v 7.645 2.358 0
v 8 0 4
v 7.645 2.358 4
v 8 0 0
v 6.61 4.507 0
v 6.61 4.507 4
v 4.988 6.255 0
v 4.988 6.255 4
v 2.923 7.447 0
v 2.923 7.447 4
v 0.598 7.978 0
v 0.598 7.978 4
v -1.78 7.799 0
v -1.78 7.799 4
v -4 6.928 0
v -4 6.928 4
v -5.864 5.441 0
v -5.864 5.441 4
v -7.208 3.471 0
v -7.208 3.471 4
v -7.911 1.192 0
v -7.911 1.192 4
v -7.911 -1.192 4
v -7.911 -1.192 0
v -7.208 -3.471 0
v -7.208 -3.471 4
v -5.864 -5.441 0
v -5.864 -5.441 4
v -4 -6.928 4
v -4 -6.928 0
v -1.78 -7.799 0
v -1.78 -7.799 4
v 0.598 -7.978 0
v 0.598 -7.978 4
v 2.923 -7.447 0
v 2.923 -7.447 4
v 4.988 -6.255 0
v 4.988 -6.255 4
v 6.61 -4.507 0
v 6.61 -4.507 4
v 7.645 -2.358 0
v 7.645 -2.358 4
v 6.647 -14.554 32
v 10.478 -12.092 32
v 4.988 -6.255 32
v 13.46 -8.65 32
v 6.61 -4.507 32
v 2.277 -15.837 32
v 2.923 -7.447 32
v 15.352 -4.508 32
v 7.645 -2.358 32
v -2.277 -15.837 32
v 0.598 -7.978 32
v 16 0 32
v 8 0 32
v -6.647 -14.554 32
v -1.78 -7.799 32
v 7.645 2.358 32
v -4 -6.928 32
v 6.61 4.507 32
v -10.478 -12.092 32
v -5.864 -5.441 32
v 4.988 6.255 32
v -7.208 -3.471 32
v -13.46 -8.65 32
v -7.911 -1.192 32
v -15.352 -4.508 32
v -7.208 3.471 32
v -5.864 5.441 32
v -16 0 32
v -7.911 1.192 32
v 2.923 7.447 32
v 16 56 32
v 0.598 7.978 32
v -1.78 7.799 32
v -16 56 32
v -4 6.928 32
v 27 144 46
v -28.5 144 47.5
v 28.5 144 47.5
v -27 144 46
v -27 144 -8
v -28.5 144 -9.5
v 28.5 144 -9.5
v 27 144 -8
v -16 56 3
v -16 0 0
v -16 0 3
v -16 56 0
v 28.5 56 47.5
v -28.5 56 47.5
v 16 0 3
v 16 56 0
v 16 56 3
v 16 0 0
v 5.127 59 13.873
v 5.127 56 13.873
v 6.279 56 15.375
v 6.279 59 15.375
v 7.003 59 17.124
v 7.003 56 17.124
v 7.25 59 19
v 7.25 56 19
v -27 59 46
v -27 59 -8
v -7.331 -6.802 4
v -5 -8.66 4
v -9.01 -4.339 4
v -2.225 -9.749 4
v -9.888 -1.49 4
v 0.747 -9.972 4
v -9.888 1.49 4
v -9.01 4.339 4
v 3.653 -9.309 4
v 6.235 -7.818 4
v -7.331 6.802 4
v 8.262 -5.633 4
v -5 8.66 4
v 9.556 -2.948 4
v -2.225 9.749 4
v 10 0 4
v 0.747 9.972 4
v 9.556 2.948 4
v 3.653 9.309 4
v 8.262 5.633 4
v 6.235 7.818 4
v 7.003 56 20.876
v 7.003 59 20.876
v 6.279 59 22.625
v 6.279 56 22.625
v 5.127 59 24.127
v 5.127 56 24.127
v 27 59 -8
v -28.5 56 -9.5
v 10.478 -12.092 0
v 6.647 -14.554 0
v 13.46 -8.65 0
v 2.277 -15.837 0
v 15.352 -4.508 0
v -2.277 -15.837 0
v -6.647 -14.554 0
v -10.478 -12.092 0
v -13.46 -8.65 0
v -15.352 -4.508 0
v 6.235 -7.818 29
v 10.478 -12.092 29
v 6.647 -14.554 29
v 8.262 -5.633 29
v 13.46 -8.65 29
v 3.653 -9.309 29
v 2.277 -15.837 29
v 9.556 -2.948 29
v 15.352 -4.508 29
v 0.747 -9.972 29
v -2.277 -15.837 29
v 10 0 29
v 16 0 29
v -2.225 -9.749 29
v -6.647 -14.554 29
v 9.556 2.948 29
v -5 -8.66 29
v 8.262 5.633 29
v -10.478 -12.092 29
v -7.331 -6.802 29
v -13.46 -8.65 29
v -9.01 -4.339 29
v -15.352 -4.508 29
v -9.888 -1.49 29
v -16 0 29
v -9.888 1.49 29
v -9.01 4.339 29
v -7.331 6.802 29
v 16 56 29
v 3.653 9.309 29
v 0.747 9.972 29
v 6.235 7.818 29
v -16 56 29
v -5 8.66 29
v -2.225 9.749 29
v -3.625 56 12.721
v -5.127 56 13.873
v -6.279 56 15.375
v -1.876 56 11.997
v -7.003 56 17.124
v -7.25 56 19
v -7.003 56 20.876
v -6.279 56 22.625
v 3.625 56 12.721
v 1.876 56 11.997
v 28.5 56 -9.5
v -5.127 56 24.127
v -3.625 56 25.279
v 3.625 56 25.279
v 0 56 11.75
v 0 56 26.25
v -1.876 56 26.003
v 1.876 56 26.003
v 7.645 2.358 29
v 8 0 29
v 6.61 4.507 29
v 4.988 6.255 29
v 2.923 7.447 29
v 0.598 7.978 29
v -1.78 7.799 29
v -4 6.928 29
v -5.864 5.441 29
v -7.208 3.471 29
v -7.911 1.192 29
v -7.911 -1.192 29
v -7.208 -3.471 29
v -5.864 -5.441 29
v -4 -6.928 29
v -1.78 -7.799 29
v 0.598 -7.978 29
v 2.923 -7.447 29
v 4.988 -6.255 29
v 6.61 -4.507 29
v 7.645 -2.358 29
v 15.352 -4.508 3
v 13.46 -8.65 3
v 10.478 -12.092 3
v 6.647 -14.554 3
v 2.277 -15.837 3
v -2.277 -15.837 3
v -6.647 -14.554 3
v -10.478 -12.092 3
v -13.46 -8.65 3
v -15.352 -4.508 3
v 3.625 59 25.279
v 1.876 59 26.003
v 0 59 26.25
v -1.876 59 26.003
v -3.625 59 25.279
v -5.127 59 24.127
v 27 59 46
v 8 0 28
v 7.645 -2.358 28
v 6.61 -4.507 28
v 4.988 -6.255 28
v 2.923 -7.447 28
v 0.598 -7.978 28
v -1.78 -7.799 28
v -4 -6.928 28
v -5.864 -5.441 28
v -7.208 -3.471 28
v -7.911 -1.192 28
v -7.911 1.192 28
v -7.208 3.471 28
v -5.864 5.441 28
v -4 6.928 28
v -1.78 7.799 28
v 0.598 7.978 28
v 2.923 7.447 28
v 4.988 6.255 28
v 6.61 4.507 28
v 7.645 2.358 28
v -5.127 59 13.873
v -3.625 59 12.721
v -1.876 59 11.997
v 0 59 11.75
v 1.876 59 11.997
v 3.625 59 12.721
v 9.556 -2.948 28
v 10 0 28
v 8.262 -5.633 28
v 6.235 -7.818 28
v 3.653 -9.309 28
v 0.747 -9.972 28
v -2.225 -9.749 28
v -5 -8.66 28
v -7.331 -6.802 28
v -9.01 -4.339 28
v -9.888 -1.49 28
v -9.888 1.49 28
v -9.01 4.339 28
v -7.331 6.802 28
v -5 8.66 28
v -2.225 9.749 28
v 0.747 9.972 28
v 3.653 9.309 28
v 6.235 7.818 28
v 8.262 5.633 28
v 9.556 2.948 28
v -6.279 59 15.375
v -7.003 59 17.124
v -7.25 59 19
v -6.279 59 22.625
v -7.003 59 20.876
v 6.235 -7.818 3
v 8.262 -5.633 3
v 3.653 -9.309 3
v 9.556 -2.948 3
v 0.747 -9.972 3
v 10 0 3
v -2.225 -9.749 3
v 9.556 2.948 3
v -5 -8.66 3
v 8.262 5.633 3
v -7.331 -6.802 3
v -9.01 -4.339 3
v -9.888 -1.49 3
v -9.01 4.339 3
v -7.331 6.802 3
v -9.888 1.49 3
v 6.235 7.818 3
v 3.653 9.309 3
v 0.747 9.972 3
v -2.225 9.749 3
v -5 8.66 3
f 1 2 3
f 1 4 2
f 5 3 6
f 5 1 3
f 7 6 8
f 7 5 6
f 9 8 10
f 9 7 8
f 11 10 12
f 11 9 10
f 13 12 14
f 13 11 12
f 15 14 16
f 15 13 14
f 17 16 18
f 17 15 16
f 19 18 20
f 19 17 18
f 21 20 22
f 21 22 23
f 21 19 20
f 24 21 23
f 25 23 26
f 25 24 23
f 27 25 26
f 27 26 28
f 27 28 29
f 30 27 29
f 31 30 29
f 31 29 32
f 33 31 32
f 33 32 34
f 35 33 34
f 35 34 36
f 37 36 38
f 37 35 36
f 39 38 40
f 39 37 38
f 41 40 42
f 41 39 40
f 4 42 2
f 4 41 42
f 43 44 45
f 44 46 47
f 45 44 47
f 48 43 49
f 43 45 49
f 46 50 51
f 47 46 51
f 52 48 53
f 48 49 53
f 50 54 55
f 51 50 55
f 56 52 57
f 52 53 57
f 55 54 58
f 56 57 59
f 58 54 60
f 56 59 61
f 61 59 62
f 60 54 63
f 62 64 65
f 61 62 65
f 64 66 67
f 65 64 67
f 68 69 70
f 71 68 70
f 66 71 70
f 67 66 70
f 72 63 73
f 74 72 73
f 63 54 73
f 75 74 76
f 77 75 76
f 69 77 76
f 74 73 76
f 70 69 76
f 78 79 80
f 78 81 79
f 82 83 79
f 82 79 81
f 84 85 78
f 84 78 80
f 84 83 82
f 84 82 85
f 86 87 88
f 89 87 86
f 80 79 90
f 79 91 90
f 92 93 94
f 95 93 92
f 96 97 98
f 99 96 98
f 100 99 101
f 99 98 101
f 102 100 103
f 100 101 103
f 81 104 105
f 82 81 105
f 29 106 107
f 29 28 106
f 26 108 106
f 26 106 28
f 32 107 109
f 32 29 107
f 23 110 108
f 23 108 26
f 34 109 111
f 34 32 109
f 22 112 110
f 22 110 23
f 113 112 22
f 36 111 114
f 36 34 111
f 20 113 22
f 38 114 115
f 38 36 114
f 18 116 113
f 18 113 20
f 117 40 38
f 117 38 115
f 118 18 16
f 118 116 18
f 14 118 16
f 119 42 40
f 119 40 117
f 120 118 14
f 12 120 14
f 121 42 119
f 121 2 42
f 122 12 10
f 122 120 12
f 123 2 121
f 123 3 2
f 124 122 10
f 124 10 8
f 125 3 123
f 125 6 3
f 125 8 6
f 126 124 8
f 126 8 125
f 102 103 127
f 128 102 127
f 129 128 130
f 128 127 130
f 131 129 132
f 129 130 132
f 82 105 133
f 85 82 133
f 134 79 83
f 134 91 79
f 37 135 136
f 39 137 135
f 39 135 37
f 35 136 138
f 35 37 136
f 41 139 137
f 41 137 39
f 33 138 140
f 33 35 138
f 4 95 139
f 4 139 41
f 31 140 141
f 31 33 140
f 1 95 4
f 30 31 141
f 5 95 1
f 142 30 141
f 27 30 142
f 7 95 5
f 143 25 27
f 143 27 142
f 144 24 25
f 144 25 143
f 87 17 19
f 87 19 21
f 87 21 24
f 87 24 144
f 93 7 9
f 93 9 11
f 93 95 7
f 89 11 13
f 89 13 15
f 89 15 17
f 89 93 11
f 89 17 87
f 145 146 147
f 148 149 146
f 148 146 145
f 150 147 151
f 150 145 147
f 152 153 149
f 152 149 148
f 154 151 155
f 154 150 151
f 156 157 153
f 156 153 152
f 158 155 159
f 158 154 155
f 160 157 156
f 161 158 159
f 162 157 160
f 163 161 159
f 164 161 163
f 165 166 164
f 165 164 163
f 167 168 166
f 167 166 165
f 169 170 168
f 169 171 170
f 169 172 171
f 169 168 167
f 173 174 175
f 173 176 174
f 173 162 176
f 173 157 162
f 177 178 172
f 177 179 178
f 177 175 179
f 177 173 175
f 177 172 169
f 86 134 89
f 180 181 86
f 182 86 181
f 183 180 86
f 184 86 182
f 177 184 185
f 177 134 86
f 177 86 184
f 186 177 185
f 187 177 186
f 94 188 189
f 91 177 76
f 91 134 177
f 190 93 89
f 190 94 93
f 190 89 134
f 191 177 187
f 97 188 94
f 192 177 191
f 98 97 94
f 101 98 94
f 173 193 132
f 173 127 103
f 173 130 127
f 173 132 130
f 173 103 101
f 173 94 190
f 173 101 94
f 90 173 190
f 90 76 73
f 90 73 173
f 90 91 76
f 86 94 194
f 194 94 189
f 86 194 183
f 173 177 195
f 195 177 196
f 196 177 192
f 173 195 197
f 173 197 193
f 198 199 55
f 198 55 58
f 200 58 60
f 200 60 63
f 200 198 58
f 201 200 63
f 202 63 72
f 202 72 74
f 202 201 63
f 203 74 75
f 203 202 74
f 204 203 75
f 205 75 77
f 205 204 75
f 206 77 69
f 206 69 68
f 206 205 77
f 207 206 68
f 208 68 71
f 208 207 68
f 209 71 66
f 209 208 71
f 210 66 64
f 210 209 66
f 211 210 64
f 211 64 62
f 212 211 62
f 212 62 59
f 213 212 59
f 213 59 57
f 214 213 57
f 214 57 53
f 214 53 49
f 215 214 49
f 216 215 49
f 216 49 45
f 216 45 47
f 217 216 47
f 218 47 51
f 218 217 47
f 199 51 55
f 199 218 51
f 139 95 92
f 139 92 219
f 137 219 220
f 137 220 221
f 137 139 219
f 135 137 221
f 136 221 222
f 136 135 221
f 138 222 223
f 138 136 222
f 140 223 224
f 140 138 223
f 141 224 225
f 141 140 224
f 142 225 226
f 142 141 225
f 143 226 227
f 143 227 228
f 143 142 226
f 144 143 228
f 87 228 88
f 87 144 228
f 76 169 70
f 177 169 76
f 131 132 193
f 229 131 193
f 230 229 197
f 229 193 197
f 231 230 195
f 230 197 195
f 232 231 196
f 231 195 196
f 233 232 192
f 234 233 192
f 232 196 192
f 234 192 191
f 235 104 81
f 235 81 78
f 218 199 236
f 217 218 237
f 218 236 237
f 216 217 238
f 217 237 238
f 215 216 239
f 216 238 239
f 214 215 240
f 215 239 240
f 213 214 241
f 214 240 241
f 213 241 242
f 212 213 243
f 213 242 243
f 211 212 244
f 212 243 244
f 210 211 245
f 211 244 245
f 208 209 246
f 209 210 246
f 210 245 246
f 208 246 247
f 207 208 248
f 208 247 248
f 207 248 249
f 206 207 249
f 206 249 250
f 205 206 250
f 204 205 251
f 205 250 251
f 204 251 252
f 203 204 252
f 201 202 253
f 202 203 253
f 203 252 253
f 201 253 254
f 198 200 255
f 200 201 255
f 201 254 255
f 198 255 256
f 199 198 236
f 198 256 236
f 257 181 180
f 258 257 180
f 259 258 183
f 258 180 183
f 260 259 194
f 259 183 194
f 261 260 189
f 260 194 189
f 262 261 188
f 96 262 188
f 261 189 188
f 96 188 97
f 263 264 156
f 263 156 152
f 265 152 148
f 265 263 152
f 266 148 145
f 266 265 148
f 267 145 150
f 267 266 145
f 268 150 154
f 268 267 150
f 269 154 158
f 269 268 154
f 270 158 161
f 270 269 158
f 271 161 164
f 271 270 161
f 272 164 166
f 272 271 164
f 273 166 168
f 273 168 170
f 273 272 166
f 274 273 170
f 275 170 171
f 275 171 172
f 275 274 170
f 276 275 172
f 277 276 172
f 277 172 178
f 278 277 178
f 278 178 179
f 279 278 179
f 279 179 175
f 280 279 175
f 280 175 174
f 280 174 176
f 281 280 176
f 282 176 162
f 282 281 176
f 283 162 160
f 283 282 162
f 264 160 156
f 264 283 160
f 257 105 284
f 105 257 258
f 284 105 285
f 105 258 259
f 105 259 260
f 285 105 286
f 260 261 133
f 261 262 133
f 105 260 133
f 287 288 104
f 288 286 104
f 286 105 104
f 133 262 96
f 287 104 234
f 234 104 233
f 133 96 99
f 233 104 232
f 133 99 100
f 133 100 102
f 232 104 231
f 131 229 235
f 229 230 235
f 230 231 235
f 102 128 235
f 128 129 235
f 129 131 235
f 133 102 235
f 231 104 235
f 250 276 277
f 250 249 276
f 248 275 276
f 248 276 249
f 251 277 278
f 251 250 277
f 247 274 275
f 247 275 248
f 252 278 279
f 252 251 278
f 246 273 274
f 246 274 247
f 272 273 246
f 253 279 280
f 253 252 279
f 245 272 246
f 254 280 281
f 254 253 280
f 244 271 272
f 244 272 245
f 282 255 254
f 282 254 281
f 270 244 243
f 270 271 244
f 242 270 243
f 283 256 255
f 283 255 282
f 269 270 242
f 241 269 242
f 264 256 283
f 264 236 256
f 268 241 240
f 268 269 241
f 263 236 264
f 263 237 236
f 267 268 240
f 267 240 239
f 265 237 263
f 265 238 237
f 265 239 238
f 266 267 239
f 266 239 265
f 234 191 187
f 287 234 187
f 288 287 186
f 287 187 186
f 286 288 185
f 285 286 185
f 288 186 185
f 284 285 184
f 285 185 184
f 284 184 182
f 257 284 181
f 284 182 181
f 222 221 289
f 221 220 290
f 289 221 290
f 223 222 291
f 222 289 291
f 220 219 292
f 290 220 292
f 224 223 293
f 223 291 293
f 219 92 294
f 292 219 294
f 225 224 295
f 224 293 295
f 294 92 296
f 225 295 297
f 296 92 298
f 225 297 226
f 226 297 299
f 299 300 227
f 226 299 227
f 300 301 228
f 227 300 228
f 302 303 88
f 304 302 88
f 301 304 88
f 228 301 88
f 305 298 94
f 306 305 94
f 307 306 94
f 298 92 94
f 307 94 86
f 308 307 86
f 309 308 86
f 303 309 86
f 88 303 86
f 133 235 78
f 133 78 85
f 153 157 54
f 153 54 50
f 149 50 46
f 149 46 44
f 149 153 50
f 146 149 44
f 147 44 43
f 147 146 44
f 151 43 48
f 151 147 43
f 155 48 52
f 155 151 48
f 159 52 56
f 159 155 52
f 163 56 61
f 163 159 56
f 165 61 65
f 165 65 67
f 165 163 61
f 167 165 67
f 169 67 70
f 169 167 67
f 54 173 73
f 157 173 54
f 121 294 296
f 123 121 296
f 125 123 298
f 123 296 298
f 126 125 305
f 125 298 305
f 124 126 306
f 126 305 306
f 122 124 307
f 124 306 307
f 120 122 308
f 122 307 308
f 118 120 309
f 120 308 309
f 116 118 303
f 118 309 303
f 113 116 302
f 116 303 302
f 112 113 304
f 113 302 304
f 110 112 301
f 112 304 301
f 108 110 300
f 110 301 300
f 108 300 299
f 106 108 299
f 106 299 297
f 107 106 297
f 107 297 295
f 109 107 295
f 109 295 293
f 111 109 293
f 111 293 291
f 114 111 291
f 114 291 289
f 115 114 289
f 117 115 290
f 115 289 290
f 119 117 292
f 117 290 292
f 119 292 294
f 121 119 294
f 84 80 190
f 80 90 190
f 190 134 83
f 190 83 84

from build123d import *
from build123d.topology import SkipClean

# Parameters (mm, degrees)
SKETCH_1_R          = 8
EXTRUDE_1_DEPTH     = 3
SKETCH_2_R          = 10
SKETCH_2_R_2        = 8
EXTRUDE_3_DEPTH     = 1
SKETCH_4_R          = 8
EXTRUDE_4_DEPTH     = 3
EXTRUDE_START       = 1
SKETCH_5_R          = 10
SKETCH_5_R_2        = 8
EXTRUDE_5_DEPTH     = 1
SKETCH_6_W          = 57
SKETCH_6_H          = 57
EXTRUDE_6_DEPTH     = 3
CUT_EXTRUDE_1_DEPTH = 5
SKETCH_10_R         = 8.25
SKETCH_10_R_2       = 7.25
EXTRUDE_7_DEPTH     = 2
SKETCH_11_W         = 32
SKETCH_11_H         = 37
CUT_EXTRUDE_2_DEPTH = 57
SKETCH_12_W         = 57
SKETCH_12_H         = 57
SKETCH_12_W_2       = 54
SKETCH_12_H_2       = 54
EXTRUDE_8_DEPTH     = 85


with BuildPart() as part:
    # 草图1 → 凸台-拉伸1 (new body)
    with BuildSketch(Plane.XY):
        with BuildLine():
            Line((-16, 0), (-16, 56))
            Line((-16, 56), (-28.5, 56))
            Line((-28.5, 56), (-28.5, 96))
            Line((-28.5, 96), (28.5, 96))
            Line((28.5, 96), (28.5, 56))
            Line((28.5, 56), (16, 56))
            Line((16, 56), (16, 0))
            ThreePointArc((16, 0), (0, -16), (-16, 0))
        make_face()
        Circle(SKETCH_1_R, mode=Mode.SUBTRACT)
    extrude(amount=EXTRUDE_1_DEPTH)

    # 草图2 → 凸台-拉伸3 (add)
    with BuildSketch(Plane.XY.offset(3)):
        Circle(SKETCH_2_R)
        Circle(SKETCH_2_R_2, mode=Mode.SUBTRACT)
    extrude(amount=EXTRUDE_3_DEPTH)



with BuildPart() as body_2:
    # 草图4 → 凸台-拉伸4 (new body)
    with BuildSketch(Plane.XY.offset(29)):
        with BuildLine():
            Line((-16, 0), (-16, 56))
            Line((-16, 56), (-28.5, 56))
            Line((-28.5, 56), (-28.5, 96))
            Line((-28.5, 96), (28.5, 96))
            Line((28.5, 96), (28.5, 56))
            Line((28.5, 56), (16, 56))
            Line((16, 56), (16, 0))
            ThreePointArc((16, 0), (0, -16), (-16, 0))
        make_face()
        Circle(SKETCH_4_R, mode=Mode.SUBTRACT)
    extrude(amount=EXTRUDE_4_DEPTH)

    # 草图5 → 凸台-拉伸5 (add)
    with BuildSketch(Plane(origin=(0, 0, 29), x_dir=(-1, 0, 0), z_dir=(0, 0, -1)).offset(EXTRUDE_START)):
        with Locations(Location((0, 0, 0), (0, 0, 180))):
            Circle(SKETCH_5_R)
        with Locations(Location((0, 0, 0), (0, 0, 180))):
            Circle(SKETCH_5_R_2, mode=Mode.SUBTRACT)
    extrude(amount=-EXTRUDE_5_DEPTH)


with BuildPart() as part_1:
    add(part.part)

    add(body_2.part)  # 凸台-拉伸6 merges body 2
    # 草图6 → 凸台-拉伸6 (add)
    with BuildSketch(Plane.XZ.offset(-56)):
        with Locations((0, 19)):
            Rectangle(SKETCH_6_W, SKETCH_6_H)
    extrude(amount=-EXTRUDE_6_DEPTH)

    # 草图9 → 切除-拉伸1 (cut)
    with BuildSketch(Plane.XZ.offset(-56)):
        with BuildLine():
            ThreePointArc((5.126524164, 24.126524164), (0, 26.25), (-5.126524164, 24.126524164))
            Line((-5.126524164, 24.126524164), (0, 19))
            Line((0, 19), (5.126524164, 24.126524164))
        make_face()
        with BuildLine():
            Line((0, 19), (-5.126524164, 24.126524164))
            ThreePointArc((-5.126524164, 24.126524164), (-7.25, 19), (-5.126524164, 13.873475836))
            Line((-5.126524164, 13.873475836), (0, 19))
        make_face()
        with BuildLine():
            Line((5.126524164, 24.126524164), (0, 19))
            Line((0, 19), (5.126524164, 13.873475836))
            ThreePointArc((5.126524164, 13.873475836), (6.698126611, 16.225545115), (7.25, 19))
            ThreePointArc((7.25, 19), (6.698126611, 21.774454885), (5.126524164, 24.126524164))
        make_face()
        with BuildLine():
            Line((5.126524164, 13.873475836), (0, 19))
            Line((0, 19), (-5.126524164, 13.873475836))
            ThreePointArc((-5.126524164, 13.873475836), (0, 11.75), (5.126524164, 13.873475836))
        make_face()
    extrude(amount=-CUT_EXTRUDE_1_DEPTH, mode=Mode.SUBTRACT)

    # 草图10 → 凸台-拉伸7 (add)
    with SkipClean():  # the faces are left unmerged after this step: merging them gives an invalid solid
        with BuildSketch(Plane(origin=(0, 59, 0), x_dir=(1, 0, 0), z_dir=(0, 1, 0))):
            with Locations((0, -19)):
                Circle(SKETCH_10_R)
            with Locations((0, -19)):
                Circle(SKETCH_10_R_2, mode=Mode.SUBTRACT)
        extrude(amount=EXTRUDE_7_DEPTH)

    # 草图11 → 切除-拉伸2 (cut)
    with BuildSketch(Plane.ZY.offset(28.5)):
        with Locations((16, 77.5)):
            Rectangle(SKETCH_11_W, SKETCH_11_H)
    extrude(amount=-CUT_EXTRUDE_2_DEPTH, mode=Mode.SUBTRACT)

    # 草图12 → 凸台-拉伸8 (add)
    with BuildSketch(Plane(origin=(0, 59, 0), x_dir=(1, 0, 0), z_dir=(0, 1, 0))):
        with Locations((0, -19)):
            Rectangle(SKETCH_12_W, SKETCH_12_H)
        with Locations((0, -19)):
            Rectangle(SKETCH_12_W_2, SKETCH_12_H_2, mode=Mode.SUBTRACT)
    extrude(amount=EXTRUDE_8_DEPTH)


solid = part_1.part
